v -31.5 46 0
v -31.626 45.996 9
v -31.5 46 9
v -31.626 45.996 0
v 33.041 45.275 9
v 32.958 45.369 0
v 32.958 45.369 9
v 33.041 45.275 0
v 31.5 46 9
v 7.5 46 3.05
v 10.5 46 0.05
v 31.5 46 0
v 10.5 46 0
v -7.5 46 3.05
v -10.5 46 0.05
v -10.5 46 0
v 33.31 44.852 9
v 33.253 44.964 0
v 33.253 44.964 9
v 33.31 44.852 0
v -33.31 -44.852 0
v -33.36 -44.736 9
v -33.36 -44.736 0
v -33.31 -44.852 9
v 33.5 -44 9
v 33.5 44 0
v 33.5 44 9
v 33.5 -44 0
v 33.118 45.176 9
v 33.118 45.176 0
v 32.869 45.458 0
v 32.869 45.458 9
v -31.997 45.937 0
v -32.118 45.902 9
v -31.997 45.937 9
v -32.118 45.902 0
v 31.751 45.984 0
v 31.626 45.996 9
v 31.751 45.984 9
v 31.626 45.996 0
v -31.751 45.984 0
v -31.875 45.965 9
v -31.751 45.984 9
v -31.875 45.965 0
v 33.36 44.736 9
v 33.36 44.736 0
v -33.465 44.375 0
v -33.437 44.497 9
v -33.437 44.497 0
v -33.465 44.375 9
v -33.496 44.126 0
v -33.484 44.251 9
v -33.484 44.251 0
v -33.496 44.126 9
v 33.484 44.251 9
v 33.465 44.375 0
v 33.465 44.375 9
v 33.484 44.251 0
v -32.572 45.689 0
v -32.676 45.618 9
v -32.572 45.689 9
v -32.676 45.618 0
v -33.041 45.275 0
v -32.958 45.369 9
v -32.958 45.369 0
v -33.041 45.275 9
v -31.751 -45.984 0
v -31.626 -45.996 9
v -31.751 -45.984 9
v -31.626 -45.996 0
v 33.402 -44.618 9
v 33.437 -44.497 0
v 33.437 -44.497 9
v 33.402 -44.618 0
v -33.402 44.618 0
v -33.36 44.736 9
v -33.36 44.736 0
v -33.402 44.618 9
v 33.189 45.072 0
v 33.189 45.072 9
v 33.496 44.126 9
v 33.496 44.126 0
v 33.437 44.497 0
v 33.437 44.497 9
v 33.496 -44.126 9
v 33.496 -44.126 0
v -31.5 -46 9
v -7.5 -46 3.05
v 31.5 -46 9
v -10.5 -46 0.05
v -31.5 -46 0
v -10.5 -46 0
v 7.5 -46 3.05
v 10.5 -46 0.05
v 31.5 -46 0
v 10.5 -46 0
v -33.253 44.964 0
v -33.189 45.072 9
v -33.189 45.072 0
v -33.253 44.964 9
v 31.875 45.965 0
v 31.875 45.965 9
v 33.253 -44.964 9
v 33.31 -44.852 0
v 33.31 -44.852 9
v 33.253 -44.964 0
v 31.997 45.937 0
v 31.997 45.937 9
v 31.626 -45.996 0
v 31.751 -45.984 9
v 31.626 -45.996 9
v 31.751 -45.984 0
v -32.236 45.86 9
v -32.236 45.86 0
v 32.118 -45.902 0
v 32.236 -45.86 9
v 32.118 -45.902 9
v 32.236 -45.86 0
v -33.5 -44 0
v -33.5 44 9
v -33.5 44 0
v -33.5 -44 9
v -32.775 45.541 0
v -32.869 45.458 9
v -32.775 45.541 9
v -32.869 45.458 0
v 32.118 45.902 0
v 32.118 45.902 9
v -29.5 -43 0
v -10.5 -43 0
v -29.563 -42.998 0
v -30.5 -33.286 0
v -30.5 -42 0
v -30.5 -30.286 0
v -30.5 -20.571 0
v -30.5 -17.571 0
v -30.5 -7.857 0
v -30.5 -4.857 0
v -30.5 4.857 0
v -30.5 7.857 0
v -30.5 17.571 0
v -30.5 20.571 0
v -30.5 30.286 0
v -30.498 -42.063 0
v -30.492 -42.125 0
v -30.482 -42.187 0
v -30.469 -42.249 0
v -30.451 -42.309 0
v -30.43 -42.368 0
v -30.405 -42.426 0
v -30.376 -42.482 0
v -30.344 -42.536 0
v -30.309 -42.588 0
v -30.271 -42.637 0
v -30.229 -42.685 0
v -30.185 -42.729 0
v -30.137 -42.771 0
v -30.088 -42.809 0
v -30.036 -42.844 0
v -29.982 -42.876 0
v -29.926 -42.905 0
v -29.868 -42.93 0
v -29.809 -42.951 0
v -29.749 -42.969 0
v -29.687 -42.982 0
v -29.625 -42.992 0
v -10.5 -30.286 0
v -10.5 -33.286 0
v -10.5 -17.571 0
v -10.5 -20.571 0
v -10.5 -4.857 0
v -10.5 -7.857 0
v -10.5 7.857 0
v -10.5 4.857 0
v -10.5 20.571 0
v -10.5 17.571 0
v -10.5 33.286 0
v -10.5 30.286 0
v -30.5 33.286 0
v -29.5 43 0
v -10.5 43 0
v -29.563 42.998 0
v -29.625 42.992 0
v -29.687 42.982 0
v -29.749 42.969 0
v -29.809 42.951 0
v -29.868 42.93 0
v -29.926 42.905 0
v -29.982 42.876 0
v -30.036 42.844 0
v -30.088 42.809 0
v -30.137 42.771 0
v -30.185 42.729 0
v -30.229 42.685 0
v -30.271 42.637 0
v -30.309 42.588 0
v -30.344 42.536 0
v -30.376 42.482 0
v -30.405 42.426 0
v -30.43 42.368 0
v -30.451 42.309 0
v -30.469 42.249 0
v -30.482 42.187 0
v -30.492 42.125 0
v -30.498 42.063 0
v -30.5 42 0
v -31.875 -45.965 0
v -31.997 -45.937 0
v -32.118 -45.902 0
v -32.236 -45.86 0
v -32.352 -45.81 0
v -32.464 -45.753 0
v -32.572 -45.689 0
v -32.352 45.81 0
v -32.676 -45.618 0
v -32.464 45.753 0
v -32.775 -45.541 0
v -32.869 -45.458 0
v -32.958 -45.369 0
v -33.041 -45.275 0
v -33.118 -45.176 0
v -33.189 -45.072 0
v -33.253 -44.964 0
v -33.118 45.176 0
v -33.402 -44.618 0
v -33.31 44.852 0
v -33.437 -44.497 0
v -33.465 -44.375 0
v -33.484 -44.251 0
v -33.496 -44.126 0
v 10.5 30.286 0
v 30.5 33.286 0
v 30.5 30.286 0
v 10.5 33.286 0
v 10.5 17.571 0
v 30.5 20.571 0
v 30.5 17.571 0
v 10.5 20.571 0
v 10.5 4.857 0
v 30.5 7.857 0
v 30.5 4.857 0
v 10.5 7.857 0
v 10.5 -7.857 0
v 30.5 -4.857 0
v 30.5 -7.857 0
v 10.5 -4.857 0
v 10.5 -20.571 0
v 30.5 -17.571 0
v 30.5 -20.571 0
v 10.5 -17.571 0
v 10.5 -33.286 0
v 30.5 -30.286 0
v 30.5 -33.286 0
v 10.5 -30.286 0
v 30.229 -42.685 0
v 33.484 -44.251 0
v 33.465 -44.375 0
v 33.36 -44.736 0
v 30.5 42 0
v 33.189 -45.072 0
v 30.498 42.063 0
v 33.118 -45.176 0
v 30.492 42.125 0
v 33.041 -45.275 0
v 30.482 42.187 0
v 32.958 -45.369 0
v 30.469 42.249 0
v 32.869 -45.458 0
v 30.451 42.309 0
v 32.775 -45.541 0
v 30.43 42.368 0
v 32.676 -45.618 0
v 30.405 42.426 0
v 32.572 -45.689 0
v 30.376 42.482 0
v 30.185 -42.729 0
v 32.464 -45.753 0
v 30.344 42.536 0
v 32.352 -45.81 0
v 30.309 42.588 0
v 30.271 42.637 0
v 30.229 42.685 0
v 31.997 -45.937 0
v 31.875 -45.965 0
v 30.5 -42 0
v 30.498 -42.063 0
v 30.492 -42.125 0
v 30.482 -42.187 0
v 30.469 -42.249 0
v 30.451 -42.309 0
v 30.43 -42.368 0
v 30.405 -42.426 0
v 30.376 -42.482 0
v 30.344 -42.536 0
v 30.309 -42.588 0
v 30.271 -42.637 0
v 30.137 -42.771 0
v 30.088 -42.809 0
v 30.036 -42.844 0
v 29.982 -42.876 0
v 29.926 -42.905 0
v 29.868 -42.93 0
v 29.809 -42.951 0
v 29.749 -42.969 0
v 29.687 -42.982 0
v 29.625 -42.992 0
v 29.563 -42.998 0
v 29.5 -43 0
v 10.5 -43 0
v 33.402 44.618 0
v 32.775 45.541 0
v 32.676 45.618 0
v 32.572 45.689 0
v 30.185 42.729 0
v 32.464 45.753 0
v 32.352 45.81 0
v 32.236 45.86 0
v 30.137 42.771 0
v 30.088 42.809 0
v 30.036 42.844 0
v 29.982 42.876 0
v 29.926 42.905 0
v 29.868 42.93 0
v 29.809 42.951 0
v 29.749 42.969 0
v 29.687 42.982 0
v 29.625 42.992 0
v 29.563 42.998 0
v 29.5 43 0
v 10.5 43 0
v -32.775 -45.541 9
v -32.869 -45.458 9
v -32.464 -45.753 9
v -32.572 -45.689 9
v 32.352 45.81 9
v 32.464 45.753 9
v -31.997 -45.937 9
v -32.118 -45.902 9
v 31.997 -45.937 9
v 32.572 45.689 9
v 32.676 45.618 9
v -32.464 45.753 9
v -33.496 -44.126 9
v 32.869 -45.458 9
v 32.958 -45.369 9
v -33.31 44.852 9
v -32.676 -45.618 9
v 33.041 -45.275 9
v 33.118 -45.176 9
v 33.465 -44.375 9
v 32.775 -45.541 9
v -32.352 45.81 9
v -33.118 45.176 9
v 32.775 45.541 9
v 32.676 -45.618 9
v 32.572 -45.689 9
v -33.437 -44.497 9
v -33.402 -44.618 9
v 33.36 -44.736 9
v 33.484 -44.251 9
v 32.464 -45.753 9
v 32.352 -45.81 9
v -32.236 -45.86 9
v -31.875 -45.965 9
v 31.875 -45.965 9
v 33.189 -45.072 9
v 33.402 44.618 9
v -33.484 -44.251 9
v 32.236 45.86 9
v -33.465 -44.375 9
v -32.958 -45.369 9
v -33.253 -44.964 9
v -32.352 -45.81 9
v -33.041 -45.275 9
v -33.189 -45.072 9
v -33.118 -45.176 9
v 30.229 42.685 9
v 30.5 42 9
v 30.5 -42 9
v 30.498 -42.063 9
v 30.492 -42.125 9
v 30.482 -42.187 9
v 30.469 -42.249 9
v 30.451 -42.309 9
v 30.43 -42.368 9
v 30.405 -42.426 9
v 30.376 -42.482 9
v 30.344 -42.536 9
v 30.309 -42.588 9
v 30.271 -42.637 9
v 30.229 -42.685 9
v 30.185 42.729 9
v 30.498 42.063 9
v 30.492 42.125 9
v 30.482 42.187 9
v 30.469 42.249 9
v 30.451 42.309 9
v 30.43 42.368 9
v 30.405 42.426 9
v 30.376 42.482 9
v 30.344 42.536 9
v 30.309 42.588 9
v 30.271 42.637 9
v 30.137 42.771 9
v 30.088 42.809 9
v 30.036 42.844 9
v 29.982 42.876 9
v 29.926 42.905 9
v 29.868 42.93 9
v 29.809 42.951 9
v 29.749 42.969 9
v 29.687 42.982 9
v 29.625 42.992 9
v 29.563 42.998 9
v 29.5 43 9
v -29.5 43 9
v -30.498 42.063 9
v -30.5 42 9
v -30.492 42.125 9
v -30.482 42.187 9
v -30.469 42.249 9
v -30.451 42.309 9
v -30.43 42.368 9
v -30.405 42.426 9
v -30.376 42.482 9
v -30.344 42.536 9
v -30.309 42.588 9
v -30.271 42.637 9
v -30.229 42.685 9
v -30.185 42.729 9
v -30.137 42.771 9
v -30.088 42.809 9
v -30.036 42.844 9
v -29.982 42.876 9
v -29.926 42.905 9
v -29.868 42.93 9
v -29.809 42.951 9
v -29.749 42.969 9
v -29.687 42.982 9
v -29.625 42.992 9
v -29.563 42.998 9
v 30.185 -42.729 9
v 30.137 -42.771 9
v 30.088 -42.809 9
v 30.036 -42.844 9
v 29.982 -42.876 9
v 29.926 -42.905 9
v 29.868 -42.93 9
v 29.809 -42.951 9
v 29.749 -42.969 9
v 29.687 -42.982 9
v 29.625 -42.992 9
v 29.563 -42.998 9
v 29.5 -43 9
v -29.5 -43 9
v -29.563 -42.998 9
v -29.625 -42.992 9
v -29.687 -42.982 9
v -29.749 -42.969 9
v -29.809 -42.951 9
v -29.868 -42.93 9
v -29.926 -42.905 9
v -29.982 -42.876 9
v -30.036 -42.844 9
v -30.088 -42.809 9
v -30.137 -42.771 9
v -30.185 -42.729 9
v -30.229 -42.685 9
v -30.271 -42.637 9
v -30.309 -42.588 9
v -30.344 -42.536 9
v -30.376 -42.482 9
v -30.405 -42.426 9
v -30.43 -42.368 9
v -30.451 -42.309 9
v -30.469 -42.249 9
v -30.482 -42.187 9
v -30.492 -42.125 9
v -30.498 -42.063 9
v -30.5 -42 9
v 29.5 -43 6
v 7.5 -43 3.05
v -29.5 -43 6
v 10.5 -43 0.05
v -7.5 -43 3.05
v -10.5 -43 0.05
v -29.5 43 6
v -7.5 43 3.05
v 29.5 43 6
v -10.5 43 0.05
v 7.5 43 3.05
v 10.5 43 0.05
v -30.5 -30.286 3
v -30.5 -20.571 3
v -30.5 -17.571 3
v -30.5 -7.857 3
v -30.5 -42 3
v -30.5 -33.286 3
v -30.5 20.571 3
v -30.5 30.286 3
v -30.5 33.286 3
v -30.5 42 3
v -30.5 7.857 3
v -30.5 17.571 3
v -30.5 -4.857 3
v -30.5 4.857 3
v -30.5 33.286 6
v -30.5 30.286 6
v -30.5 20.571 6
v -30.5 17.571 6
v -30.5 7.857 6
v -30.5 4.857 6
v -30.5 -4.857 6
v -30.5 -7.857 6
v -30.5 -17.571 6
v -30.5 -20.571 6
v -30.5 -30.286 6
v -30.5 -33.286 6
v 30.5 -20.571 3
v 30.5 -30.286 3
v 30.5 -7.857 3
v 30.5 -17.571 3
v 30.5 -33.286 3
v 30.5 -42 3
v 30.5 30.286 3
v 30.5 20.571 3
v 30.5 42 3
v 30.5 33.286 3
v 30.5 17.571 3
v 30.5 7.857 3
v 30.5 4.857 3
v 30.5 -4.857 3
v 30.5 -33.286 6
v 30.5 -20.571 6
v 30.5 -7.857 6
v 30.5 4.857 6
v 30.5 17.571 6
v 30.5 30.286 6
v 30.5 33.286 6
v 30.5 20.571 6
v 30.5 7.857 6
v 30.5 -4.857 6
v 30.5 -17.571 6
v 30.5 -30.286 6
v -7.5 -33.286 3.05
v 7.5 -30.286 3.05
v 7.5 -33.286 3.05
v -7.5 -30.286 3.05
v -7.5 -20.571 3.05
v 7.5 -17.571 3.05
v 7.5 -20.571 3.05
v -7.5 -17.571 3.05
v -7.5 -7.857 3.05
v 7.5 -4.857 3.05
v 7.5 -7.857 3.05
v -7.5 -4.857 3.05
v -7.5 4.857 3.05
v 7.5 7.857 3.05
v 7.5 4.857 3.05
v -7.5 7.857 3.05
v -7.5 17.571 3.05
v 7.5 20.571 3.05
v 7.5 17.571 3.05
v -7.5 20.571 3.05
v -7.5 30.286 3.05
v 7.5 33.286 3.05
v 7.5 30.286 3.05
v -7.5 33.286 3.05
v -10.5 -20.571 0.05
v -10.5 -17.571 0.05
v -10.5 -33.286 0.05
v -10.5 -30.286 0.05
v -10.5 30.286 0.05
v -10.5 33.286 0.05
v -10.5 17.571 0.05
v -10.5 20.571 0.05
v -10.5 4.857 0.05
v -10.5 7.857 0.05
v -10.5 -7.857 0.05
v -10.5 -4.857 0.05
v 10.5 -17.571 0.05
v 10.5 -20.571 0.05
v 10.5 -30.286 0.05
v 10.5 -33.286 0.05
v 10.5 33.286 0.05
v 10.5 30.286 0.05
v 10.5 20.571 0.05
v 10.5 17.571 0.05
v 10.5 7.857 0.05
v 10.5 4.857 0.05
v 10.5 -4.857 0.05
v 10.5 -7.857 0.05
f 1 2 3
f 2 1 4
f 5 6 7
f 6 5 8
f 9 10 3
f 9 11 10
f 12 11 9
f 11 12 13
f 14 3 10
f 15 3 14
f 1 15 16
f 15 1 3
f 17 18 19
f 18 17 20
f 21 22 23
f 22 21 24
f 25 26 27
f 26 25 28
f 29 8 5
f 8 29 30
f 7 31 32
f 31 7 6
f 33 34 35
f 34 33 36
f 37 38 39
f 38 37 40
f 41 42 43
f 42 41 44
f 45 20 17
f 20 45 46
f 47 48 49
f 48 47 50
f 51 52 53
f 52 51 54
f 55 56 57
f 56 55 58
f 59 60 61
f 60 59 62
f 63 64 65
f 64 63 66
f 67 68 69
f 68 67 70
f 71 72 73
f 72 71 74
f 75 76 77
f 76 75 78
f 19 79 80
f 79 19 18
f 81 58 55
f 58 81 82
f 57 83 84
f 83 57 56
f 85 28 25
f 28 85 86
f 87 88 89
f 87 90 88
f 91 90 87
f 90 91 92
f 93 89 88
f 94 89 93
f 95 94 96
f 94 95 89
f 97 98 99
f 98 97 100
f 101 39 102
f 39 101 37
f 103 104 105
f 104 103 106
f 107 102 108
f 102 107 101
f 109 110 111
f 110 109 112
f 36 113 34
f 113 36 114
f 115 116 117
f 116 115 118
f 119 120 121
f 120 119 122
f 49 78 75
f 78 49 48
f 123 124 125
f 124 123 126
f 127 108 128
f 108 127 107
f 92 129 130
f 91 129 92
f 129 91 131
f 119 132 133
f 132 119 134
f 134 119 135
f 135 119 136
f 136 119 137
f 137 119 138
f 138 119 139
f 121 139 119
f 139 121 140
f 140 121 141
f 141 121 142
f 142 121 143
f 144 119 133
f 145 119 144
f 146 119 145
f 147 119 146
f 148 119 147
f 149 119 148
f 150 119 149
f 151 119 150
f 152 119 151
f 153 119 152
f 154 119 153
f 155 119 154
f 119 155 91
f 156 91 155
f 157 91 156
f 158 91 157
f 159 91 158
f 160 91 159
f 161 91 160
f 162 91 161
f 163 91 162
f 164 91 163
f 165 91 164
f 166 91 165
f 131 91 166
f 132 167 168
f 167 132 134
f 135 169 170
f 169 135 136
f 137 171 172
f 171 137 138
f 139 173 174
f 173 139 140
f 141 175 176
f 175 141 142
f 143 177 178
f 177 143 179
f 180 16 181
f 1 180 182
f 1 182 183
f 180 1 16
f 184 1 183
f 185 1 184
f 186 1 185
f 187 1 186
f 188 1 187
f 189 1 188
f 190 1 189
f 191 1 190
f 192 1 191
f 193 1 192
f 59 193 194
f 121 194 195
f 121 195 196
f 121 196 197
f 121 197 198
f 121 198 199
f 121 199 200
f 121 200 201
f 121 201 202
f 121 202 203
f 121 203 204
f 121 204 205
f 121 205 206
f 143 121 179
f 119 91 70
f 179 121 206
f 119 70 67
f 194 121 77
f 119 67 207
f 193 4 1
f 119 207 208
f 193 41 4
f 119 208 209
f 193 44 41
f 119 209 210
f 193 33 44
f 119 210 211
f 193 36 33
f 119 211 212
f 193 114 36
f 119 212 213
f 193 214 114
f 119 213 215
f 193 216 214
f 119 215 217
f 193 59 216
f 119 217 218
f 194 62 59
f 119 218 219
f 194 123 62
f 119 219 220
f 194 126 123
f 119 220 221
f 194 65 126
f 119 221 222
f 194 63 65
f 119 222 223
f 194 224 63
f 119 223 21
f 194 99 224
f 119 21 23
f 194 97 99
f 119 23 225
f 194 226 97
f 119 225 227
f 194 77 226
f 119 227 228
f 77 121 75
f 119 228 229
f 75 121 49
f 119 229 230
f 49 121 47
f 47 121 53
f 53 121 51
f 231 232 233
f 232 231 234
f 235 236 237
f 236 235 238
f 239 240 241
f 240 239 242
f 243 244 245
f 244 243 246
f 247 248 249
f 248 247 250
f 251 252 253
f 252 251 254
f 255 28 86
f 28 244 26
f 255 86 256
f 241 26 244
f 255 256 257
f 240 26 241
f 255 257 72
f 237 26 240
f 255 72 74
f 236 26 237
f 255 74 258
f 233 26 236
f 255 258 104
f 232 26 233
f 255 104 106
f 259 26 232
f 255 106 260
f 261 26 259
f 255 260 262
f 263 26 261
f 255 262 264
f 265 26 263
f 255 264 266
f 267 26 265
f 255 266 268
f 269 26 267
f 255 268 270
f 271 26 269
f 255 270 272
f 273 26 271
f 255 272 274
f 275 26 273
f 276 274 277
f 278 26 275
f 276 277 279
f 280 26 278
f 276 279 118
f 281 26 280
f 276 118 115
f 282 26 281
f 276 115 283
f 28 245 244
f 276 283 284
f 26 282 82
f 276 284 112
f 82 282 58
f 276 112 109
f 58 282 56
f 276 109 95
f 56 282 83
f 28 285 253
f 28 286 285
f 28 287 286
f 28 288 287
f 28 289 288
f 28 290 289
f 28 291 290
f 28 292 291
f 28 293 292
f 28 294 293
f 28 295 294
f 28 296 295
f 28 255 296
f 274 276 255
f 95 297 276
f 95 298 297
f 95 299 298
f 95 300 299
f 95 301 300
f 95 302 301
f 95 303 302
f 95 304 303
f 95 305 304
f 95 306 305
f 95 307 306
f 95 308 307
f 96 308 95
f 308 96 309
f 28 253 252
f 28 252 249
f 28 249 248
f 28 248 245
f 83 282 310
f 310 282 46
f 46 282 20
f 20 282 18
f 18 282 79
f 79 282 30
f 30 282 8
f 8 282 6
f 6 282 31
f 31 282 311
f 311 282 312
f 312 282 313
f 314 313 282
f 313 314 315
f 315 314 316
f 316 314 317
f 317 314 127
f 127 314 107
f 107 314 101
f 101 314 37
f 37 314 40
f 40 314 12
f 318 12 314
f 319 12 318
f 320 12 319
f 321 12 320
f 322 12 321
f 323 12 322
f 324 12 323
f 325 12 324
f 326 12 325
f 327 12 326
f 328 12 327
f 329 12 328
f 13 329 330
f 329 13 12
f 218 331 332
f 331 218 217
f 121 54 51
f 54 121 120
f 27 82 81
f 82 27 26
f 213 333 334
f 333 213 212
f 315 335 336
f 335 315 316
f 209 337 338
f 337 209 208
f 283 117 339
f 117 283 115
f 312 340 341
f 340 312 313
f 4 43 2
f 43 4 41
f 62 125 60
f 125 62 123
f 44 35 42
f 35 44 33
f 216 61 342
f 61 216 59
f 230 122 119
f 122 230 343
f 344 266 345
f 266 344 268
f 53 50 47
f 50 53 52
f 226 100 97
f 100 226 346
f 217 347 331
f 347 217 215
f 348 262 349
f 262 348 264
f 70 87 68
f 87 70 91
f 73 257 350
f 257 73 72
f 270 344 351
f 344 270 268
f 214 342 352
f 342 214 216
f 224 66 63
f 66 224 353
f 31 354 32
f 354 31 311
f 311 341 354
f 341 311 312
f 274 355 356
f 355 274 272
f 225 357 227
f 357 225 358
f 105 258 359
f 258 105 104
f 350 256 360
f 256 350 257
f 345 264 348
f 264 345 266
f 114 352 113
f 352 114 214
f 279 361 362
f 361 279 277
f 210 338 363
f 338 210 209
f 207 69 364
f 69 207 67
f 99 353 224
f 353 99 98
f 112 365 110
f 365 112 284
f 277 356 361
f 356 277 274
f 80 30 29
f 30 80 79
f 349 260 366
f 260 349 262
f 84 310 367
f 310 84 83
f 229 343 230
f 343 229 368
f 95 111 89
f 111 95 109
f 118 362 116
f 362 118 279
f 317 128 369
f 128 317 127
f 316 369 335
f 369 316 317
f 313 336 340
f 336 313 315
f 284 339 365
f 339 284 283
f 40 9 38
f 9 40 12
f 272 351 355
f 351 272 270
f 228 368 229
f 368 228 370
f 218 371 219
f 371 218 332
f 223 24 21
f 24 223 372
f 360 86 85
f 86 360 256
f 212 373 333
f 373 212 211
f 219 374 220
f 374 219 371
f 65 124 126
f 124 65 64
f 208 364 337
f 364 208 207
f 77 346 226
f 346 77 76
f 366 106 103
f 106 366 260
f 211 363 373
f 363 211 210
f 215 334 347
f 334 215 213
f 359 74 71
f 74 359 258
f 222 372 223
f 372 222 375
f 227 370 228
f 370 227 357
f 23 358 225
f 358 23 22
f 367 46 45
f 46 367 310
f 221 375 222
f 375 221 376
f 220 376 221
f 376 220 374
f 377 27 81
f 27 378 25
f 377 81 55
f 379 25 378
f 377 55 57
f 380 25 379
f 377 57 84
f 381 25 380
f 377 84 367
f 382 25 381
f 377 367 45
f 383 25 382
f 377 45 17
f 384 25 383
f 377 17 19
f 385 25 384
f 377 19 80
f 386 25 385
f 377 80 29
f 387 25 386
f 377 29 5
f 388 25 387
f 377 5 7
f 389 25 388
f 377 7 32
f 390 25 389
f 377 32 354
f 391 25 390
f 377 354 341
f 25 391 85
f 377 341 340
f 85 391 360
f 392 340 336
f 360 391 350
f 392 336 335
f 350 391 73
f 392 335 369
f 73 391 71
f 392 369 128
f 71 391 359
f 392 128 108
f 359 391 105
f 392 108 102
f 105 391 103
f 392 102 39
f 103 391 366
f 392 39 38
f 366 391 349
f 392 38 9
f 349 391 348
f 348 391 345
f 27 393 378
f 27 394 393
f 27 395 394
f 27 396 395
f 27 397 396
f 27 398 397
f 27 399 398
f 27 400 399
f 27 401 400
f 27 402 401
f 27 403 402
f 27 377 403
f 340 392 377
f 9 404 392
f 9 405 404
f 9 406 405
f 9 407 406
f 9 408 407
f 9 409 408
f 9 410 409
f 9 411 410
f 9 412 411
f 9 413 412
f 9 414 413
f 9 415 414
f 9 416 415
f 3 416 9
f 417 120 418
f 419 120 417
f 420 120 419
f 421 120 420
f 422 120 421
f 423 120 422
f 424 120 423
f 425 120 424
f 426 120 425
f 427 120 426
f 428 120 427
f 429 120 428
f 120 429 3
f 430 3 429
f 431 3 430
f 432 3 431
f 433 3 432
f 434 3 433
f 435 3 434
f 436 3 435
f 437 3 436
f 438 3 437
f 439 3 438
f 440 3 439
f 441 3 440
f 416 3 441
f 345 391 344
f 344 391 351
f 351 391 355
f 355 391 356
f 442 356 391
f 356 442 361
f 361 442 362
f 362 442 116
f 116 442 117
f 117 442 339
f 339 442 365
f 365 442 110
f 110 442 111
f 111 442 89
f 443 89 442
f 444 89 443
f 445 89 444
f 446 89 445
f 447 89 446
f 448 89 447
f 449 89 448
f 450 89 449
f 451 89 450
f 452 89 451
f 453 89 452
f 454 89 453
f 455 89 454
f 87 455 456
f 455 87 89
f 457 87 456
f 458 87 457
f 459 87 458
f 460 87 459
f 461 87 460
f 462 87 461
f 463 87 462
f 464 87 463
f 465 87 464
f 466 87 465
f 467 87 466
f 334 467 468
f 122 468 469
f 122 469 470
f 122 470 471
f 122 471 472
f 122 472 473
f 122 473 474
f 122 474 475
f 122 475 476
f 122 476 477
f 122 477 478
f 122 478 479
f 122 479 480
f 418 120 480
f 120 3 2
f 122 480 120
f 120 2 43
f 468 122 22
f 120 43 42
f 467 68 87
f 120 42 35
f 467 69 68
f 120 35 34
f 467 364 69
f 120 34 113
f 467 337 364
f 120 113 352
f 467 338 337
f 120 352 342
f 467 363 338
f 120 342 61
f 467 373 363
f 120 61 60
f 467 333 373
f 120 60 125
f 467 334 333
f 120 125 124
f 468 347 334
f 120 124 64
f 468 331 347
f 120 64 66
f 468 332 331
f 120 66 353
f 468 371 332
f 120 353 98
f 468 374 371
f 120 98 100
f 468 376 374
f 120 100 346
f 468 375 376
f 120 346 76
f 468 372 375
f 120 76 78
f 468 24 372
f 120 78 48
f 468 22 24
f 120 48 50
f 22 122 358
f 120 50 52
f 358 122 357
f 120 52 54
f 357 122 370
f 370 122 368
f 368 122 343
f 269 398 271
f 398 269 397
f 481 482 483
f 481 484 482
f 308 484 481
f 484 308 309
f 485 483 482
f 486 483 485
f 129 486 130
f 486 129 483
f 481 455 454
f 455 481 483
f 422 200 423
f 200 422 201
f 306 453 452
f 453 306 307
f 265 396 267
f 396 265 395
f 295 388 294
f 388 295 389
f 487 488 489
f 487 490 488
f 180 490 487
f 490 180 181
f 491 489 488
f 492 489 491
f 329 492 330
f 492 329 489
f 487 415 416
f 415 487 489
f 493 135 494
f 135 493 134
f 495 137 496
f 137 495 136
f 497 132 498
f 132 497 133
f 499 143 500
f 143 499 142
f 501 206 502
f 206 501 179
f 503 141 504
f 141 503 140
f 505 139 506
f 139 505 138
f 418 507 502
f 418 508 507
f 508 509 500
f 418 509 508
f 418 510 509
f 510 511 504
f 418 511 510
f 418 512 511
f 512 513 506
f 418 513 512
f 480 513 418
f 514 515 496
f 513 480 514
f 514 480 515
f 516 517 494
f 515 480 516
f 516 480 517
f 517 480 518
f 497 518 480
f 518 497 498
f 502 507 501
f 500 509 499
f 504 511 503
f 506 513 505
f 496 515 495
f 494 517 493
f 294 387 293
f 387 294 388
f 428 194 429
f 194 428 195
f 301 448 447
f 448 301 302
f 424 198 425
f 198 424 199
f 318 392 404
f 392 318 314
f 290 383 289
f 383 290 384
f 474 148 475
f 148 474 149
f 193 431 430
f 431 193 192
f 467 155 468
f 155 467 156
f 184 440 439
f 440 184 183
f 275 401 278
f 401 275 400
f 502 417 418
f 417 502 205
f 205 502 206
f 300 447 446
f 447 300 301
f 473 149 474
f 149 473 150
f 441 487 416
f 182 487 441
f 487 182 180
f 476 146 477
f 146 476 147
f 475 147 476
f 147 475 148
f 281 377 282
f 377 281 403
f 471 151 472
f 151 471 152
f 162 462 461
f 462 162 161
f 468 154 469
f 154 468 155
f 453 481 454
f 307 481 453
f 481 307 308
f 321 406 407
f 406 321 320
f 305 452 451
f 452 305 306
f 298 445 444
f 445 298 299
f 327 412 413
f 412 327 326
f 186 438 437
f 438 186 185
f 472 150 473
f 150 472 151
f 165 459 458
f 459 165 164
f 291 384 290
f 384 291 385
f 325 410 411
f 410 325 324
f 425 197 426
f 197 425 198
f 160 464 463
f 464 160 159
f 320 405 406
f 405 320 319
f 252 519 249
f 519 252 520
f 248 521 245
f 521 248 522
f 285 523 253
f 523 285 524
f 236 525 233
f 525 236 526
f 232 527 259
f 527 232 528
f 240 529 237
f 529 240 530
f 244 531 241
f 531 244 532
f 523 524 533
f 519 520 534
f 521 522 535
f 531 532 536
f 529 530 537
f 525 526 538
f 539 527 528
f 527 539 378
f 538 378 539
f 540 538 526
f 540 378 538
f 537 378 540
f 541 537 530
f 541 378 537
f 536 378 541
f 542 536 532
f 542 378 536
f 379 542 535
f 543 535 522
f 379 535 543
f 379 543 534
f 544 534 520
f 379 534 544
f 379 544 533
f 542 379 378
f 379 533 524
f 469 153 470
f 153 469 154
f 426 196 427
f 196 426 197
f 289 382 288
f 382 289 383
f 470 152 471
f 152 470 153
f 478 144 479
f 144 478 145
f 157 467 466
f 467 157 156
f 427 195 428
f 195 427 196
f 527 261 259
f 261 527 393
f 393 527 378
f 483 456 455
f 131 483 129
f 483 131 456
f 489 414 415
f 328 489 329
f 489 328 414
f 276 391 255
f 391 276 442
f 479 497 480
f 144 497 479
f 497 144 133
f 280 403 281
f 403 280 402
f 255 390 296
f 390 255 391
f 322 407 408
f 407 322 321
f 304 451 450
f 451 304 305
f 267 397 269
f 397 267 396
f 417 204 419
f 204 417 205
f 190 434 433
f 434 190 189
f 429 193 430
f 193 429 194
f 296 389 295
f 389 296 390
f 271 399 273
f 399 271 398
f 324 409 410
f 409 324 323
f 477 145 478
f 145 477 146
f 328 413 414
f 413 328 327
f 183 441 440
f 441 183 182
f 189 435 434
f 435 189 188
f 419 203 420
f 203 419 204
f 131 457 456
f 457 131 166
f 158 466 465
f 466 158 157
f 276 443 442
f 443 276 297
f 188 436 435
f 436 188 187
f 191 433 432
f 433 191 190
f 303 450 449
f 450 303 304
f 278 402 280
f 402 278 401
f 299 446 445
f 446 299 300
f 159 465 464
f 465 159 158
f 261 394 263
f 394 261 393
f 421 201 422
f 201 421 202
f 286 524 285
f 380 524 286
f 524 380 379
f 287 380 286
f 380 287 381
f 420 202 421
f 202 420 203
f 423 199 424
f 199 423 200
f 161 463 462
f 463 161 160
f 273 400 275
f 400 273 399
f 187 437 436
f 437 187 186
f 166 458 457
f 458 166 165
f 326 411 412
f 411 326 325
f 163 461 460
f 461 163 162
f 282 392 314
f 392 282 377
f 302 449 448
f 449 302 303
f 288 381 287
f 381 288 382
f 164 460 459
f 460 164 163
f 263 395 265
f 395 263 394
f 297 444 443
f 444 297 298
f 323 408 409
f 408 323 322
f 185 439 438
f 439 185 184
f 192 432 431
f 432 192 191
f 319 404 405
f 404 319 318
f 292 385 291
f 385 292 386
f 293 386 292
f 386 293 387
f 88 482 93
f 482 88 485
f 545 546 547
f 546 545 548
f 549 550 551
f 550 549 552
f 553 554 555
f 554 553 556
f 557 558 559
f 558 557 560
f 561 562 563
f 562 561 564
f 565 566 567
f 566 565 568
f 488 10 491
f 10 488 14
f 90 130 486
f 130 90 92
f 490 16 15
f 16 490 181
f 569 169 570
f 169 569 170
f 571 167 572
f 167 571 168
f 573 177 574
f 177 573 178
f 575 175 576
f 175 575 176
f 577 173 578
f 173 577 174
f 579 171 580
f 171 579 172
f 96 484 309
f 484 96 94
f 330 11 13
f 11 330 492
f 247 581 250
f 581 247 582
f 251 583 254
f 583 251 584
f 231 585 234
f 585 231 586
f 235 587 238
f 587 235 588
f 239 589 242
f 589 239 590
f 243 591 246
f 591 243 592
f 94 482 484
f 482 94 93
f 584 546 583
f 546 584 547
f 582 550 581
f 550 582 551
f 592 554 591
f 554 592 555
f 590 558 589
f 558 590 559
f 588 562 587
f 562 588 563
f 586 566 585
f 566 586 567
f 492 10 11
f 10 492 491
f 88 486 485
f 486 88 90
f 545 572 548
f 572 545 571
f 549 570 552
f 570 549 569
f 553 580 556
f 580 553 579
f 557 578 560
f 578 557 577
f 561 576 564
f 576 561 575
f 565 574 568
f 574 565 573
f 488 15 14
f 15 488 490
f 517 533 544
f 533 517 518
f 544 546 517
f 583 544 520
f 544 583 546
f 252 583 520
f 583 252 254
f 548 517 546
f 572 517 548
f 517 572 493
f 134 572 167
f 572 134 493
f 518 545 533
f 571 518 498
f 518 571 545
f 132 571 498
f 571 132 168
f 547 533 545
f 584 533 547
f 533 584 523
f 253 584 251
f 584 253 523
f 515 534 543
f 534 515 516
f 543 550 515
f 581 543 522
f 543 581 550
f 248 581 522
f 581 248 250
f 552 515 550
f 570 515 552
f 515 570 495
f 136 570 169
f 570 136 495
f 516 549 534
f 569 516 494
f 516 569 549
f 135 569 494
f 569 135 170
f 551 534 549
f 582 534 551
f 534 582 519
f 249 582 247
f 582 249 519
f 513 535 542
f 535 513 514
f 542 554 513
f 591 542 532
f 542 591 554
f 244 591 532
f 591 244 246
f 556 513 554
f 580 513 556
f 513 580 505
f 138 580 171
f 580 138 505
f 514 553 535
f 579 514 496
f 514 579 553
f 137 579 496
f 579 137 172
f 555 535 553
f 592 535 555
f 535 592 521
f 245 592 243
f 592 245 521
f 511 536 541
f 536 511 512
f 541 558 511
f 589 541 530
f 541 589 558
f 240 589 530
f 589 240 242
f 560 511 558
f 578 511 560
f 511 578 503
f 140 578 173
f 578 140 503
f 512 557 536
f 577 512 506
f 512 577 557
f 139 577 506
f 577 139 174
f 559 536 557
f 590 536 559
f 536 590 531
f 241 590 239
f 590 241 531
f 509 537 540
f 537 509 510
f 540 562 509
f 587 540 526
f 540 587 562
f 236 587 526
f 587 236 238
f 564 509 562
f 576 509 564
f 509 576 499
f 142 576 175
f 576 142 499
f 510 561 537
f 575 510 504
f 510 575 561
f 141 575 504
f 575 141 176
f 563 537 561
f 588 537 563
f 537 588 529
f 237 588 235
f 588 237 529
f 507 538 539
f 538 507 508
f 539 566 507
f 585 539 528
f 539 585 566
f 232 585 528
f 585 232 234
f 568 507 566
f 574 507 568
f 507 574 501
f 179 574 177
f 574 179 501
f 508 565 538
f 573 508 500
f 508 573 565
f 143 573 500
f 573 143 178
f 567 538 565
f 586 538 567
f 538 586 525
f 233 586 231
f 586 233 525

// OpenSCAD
$fn=100;

soapLength = 85;
soapWidth  = 60;
clearance = 1;
border = 1;

/**********************************/
t=3;
l=soapLength+t*2+clearance;
w=soapWidth+t*2+clearance; 
h=6;
o=15;
div=6;
s=(l-t)/(div+1);

if(border){
    difference(){
        translate([-w/2,-l/2,0])
        rcube(w,l,h+t,2);
        
        translate([-w/2+t,-l/2+t,-.1])
        rcube(w-t*2,l-t*2,h+t+1,1);
        
        hull(){
            translate([0,0,h/2])
            cube([o,l*2,.1],true);
            
            cube([o+h,l*2,.1],true);
        }        
    }
    
    intersection(){
        translate([-w/2,-l/2,0])
        rcube(w,l,h+t,2);

        grid();
    }
}else{            
    grid();
}            

module grid(){
    difference(){
        union(){
            translate([-w/2,-l/2, 0])
            cube([t,l,t]);
            translate([w/2-t,-l/2, 0])
            cube([t,l,t]);
            
            for(i=[-l/2+t/2:s:l/2]){
                translate([0,i,0])
                translate([-w/2,-t/2,0])
                cube([w,h/2,h]);
            }
        }
            
        hull(){
            translate([0,0,h/2])
            cube([o,l*2,.1],true);
            cube([o+h,l*2,.1],true);
        }        
    }    
}

module rcube(length,width,height,radius=.5){    
    l=length-2*radius;
    w=width-2*radius;
    translate([radius,radius,0])
    hull(){
        cylinder(r=radius,h=height);    
        translate([0,w,0])
        cylinder(r=radius,h=height);    
        translate([l,0,0])
        cylinder(r=radius,h=height);    
        translate([l,w,0])
        cylinder(r=radius,h=height);    
    }
}
